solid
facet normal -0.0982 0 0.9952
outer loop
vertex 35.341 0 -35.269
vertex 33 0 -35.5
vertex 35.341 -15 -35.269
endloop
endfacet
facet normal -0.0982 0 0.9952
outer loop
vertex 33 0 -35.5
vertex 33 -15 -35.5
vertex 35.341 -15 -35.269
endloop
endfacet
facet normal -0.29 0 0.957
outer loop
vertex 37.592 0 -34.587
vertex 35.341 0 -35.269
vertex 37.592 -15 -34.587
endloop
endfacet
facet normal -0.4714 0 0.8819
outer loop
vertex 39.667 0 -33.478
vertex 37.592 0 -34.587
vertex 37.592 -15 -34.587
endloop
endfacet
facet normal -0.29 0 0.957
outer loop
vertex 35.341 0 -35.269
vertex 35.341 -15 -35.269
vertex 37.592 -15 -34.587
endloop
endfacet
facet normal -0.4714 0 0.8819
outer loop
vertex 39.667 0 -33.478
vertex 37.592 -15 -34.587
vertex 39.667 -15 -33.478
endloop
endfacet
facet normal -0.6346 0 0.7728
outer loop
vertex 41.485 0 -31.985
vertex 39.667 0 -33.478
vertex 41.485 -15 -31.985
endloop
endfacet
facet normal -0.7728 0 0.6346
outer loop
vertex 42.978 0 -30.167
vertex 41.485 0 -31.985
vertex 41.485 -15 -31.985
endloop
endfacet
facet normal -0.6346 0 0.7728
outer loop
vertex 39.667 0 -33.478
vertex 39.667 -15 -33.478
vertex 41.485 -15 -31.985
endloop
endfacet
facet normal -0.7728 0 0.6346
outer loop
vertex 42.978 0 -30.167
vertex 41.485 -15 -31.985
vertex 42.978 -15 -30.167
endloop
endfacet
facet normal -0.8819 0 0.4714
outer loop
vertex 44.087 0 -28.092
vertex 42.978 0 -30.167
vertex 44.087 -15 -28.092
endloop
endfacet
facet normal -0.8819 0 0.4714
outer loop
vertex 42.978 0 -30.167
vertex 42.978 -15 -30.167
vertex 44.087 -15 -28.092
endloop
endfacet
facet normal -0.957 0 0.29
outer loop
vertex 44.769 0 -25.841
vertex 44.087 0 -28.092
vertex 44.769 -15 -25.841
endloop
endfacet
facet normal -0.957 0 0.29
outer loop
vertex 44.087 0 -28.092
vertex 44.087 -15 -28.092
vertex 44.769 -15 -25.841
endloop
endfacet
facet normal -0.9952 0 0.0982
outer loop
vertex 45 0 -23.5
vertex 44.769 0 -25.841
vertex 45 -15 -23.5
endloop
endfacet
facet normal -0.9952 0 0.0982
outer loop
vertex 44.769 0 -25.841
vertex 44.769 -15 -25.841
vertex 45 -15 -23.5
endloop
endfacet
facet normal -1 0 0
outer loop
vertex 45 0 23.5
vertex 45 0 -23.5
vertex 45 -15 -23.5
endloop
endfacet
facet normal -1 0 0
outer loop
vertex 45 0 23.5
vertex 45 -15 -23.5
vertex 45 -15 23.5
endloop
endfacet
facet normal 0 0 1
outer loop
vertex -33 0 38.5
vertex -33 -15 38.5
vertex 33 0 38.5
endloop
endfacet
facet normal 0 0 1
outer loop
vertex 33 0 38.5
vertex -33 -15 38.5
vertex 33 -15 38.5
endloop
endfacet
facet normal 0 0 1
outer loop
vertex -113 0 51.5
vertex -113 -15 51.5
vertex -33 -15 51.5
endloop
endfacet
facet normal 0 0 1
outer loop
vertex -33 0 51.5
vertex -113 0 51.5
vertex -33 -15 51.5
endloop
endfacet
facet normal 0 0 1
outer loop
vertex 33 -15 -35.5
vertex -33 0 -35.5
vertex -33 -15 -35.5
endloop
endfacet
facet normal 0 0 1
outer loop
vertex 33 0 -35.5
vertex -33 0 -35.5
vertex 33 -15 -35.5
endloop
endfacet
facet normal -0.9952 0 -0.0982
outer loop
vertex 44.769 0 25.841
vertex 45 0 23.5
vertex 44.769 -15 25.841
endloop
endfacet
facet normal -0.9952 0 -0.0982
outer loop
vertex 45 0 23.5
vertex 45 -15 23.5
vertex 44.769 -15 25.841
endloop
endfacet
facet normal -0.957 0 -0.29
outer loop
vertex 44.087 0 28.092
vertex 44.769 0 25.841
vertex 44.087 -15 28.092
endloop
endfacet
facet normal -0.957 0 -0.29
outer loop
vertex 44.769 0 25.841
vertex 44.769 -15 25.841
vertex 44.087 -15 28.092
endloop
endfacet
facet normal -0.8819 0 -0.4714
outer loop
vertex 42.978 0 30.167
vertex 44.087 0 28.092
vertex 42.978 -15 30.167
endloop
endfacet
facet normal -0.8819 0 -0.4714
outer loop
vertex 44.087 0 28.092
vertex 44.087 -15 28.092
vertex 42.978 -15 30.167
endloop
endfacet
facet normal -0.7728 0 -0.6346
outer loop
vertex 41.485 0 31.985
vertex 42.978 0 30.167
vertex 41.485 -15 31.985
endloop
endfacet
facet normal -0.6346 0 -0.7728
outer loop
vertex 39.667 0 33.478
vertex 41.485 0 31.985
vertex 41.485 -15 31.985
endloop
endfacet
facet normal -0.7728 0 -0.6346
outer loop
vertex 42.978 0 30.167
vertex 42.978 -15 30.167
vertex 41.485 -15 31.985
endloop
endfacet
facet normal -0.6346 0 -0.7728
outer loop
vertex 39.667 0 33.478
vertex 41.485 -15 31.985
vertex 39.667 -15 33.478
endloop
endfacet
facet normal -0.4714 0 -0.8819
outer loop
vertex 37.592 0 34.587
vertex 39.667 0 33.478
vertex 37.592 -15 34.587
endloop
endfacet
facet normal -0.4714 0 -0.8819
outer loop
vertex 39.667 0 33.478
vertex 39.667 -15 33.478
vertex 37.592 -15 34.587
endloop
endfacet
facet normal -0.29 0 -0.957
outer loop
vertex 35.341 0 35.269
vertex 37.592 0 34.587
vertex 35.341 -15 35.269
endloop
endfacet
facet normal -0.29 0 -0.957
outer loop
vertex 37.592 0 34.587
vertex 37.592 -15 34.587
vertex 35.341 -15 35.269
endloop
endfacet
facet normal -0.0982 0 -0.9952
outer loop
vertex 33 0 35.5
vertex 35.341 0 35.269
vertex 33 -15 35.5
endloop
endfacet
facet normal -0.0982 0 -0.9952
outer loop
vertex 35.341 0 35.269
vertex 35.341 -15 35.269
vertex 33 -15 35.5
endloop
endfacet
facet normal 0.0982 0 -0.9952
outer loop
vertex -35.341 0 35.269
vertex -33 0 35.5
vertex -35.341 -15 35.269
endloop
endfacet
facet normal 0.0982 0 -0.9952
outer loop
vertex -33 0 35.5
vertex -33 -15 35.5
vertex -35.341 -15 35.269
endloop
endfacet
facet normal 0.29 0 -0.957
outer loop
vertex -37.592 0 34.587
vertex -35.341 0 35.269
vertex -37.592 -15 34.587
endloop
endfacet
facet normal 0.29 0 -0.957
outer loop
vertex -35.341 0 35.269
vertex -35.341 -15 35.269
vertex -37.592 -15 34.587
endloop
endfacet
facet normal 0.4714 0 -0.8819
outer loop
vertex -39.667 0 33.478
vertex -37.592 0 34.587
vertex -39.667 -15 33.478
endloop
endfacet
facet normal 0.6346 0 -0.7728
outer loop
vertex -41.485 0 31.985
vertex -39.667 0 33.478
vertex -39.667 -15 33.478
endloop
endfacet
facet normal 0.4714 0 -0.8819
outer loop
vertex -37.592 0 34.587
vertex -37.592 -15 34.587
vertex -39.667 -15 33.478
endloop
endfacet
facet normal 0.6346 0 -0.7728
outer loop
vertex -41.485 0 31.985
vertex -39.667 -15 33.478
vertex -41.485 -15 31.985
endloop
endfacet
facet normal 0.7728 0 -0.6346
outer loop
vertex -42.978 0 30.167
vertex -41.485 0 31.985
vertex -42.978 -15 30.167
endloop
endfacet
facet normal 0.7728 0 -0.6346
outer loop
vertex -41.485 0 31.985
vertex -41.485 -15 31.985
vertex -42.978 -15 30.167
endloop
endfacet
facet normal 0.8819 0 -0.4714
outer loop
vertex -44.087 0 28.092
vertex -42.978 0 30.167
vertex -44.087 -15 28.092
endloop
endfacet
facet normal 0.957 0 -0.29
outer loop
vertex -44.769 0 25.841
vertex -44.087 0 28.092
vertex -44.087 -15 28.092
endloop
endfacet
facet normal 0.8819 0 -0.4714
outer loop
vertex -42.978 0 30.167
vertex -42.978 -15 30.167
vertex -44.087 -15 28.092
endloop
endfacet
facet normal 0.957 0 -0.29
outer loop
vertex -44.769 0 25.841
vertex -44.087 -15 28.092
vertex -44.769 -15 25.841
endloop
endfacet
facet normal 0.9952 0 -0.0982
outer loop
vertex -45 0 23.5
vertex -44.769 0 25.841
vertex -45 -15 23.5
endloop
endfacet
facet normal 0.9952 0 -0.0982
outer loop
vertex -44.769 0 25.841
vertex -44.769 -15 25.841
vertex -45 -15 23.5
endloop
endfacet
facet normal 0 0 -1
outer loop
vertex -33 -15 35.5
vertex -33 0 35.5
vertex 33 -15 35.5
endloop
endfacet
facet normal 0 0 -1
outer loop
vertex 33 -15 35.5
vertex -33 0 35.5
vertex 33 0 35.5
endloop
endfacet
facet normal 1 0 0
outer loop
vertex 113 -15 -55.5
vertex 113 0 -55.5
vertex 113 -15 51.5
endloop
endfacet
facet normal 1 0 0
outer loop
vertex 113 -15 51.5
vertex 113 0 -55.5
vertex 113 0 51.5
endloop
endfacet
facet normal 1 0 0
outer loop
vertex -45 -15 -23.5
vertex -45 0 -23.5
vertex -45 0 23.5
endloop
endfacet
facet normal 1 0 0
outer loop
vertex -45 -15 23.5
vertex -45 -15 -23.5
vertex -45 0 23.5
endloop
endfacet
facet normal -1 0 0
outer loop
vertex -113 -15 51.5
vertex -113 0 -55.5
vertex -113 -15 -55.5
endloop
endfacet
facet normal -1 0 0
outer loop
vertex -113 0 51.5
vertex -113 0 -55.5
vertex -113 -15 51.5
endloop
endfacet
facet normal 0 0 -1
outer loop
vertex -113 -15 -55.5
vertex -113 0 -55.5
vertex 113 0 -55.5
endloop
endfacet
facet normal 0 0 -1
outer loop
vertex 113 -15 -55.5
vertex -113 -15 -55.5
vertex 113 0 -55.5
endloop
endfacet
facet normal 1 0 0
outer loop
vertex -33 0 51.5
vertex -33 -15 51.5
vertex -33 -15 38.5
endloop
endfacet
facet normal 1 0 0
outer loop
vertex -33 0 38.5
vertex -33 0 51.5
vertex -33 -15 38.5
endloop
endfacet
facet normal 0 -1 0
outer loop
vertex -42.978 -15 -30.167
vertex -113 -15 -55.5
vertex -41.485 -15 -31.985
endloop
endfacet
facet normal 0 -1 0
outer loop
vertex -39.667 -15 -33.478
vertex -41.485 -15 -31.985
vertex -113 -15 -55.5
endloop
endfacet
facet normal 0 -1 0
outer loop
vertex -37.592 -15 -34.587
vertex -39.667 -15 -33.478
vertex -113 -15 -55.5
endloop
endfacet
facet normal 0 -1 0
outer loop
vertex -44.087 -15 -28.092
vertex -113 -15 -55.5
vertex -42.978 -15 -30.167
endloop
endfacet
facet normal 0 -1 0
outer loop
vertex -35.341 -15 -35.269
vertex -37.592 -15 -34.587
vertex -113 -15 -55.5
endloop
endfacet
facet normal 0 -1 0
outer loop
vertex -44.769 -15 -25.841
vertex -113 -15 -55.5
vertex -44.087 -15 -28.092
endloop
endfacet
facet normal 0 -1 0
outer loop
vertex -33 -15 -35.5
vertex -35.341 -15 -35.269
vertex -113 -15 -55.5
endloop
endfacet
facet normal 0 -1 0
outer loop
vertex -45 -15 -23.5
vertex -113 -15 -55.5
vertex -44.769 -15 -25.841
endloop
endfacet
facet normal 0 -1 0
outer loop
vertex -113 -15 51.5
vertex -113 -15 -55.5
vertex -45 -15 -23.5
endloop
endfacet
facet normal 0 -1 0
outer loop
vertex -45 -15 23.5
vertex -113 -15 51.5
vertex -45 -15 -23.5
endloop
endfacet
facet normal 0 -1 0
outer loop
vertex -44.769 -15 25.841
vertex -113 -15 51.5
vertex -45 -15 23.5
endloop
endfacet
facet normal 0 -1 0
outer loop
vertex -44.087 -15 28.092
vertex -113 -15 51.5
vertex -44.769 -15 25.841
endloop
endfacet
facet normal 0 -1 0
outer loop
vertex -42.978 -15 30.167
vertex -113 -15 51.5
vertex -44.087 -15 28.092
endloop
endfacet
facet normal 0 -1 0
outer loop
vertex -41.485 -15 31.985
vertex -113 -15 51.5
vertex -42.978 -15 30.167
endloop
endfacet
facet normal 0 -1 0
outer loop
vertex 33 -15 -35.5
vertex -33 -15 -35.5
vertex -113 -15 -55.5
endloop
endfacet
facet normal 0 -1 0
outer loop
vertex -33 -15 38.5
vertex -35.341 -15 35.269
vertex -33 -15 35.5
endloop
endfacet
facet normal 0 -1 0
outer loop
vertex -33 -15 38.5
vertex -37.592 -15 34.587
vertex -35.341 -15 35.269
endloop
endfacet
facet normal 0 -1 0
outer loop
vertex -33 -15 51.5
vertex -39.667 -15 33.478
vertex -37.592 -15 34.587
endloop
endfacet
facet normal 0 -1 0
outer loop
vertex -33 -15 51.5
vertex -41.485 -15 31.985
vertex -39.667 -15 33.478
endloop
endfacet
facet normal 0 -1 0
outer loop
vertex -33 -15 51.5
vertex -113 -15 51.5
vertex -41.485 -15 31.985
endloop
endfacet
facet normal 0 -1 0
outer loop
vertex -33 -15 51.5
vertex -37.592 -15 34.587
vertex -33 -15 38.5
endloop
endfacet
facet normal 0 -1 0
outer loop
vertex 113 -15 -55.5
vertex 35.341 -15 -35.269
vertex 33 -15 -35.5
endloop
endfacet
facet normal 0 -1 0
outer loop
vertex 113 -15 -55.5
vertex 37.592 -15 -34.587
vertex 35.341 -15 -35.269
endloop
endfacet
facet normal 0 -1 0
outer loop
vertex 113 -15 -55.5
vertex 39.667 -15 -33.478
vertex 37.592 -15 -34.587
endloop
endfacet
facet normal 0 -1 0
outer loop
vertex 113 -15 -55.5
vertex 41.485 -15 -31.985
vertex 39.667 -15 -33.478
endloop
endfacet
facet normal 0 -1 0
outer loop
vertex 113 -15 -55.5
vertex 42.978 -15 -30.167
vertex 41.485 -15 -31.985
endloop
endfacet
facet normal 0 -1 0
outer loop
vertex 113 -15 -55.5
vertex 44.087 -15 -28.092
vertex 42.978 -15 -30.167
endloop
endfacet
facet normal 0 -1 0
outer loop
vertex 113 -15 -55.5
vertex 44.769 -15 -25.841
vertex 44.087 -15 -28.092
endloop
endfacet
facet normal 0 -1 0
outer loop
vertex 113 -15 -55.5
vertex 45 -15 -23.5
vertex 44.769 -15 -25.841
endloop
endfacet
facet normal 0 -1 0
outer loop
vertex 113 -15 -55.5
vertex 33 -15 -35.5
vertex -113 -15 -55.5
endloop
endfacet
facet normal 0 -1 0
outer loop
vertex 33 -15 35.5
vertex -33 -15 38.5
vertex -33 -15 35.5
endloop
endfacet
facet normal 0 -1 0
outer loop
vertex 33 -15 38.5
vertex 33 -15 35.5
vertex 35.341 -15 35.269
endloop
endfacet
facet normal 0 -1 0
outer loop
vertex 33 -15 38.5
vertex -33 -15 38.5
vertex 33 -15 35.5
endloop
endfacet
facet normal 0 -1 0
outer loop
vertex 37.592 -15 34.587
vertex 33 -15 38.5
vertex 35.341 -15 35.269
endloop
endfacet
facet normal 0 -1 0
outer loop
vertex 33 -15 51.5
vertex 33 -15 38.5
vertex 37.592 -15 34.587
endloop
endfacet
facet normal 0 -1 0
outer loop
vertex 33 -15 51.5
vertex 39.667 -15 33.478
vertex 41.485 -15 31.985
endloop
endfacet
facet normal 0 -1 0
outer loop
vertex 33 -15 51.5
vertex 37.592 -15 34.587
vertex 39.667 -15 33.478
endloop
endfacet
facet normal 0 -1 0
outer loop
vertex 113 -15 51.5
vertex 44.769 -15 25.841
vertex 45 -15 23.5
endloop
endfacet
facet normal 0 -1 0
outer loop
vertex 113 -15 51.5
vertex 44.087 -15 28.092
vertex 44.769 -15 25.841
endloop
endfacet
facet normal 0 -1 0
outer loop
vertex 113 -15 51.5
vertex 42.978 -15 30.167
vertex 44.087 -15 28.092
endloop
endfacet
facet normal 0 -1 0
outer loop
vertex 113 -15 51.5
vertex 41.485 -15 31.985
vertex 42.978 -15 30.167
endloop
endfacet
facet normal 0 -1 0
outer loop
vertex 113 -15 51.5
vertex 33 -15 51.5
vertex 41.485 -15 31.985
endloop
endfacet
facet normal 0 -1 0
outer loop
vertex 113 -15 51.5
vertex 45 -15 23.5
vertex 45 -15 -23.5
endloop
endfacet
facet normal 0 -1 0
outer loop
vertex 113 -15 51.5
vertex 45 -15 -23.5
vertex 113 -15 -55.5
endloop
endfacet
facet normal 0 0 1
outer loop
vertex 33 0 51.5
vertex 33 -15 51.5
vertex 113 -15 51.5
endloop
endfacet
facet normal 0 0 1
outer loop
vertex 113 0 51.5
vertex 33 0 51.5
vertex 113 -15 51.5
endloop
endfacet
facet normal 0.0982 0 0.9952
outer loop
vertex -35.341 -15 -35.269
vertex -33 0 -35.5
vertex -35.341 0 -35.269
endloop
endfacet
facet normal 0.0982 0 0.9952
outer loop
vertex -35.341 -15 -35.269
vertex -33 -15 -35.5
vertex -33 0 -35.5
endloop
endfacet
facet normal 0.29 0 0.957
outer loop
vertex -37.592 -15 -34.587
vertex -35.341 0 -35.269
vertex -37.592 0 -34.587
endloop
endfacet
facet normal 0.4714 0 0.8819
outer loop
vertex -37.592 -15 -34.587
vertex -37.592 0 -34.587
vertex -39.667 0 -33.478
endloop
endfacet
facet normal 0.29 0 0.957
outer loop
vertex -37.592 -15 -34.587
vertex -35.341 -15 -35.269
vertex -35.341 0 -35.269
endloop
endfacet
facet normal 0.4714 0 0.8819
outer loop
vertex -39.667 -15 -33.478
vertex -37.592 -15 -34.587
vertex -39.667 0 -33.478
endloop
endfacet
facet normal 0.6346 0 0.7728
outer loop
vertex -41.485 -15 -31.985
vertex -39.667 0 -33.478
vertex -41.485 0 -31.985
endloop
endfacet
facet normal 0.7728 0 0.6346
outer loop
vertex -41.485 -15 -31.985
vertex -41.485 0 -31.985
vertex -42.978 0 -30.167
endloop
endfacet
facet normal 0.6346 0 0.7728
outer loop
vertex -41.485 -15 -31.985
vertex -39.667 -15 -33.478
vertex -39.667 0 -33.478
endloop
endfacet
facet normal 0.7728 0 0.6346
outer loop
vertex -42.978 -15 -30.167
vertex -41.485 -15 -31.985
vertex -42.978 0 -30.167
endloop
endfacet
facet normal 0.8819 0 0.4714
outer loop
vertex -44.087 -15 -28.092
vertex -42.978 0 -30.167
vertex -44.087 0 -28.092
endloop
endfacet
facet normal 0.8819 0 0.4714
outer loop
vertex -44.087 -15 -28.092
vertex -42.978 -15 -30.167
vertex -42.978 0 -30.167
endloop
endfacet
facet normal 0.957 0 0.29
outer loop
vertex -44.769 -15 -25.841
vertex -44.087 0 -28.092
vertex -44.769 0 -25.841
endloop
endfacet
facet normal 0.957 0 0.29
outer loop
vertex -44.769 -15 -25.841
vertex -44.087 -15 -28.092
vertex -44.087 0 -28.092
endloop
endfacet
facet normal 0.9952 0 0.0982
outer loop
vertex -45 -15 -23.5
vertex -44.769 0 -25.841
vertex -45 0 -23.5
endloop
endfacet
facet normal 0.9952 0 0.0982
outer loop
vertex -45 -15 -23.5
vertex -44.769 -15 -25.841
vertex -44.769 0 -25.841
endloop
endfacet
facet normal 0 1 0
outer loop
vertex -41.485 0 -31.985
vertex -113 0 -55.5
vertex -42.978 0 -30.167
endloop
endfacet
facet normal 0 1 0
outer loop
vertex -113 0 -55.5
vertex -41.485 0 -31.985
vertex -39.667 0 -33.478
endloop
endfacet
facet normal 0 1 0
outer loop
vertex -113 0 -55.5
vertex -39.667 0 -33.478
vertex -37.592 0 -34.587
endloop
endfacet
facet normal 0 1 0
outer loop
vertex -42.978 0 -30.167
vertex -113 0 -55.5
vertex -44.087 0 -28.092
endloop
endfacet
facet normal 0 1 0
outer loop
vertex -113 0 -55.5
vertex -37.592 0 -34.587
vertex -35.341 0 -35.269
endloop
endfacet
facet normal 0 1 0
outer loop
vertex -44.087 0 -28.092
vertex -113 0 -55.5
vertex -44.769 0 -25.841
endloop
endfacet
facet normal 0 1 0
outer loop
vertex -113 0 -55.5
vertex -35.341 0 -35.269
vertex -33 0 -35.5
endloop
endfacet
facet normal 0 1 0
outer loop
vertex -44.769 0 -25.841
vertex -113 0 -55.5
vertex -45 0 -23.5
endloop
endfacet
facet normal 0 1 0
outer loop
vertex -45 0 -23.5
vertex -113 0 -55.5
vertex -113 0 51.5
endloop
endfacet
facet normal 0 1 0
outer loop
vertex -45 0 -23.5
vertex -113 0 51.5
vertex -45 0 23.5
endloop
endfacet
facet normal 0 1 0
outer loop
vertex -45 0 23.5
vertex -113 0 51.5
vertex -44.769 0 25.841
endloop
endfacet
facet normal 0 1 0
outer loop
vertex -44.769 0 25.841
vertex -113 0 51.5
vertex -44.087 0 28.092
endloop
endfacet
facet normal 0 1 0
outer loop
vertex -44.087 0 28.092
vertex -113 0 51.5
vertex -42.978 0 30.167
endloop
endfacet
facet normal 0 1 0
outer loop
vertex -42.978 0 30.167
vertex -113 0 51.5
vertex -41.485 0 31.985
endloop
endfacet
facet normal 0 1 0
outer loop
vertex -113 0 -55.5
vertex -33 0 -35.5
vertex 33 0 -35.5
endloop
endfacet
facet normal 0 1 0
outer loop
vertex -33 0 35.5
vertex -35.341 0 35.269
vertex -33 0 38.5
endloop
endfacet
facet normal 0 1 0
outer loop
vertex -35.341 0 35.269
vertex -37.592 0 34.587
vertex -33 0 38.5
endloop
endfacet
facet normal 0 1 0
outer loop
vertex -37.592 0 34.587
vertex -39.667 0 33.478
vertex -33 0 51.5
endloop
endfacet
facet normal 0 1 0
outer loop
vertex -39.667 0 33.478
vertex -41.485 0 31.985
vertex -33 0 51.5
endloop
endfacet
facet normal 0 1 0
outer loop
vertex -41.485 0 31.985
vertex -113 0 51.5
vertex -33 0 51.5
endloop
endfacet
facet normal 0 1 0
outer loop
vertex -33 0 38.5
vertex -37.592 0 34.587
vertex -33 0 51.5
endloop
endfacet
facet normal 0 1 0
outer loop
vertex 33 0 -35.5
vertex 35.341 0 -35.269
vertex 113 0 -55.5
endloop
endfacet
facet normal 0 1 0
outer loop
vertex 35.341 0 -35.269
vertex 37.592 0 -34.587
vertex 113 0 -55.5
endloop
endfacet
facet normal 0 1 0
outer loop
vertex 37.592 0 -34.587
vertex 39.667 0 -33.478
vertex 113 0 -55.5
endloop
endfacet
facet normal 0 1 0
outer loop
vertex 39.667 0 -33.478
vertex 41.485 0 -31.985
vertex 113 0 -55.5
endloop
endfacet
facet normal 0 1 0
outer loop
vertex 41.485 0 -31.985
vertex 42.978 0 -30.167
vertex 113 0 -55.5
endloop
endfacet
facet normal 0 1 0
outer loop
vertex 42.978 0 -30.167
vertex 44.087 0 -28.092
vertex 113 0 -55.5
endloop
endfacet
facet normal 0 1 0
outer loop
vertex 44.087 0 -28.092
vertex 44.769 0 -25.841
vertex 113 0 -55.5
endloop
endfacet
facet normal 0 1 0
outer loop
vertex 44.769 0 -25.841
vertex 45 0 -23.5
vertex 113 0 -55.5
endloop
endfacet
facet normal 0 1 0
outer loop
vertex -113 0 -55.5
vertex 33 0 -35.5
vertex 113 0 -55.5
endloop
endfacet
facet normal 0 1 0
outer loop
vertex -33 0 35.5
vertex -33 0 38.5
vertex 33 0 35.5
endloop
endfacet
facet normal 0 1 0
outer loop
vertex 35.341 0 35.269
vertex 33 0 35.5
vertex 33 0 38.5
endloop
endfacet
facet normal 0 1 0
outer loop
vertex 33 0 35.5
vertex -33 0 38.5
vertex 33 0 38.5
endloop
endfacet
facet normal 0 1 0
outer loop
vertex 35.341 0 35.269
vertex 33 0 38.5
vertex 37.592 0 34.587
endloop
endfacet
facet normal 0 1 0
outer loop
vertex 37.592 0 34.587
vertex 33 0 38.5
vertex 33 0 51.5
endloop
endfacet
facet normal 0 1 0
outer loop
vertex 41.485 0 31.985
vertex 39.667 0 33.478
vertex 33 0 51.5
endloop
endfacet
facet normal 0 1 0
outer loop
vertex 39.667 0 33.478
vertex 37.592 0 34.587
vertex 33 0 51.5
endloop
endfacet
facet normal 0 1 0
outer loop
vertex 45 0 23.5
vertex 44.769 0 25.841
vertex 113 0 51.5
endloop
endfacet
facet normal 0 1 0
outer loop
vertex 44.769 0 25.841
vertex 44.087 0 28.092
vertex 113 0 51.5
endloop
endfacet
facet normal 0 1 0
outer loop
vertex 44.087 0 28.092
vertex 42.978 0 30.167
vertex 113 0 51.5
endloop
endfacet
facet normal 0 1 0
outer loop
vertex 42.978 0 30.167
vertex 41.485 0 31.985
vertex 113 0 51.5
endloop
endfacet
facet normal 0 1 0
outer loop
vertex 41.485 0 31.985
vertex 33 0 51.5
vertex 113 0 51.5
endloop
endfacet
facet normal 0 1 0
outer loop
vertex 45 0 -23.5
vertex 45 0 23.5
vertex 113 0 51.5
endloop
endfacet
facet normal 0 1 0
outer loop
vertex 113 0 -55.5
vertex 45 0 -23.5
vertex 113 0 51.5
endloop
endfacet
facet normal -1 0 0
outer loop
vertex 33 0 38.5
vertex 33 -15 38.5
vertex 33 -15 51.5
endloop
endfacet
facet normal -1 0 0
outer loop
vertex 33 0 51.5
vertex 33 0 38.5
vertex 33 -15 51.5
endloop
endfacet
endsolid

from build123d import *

# Parameters (mm, degrees)
F0_W     = 226
F0_H     = 111
F0_W_2   = 90
F0_H_2   = 71
F1_DEPTH = 15
F2_R     = 12
F4_DEPTH = 25


with BuildPart() as f1:
    # F0 (on Front) → F1 (new body)
    with BuildSketch(Plane.XZ):
        Rectangle(F0_W, F0_H)
        Rectangle(F0_W_2, F0_H_2, mode=Mode.SUBTRACT)
    extrude(amount=F1_DEPTH)

    # F2
    f2_edges = [f1.edges().sort_by_distance(p)[0] for p in [
        (45, -7.5, 35.5),
        (45, -7.5, -35.5),
        (-45, -7.5, -35.5),
        (-45, -7.5, 35.5),
    ]]
    fillet(f2_edges, radius=F2_R)

    # F3 (on face) → F4 (cut)
    with BuildSketch(Plane.XZ.offset(15)):
        Polygon((-33, 51.5), (-33, 47.5), (-33, 38.5), (33, 38.5), (33, 47.5), (33, 51.5), (113, 51.5), (113, 55.5), (-113, 55.5), (-113, 51.5), align=None)
    extrude(amount=-F4_DEPTH, mode=Mode.SUBTRACT)


solid = f1.part
